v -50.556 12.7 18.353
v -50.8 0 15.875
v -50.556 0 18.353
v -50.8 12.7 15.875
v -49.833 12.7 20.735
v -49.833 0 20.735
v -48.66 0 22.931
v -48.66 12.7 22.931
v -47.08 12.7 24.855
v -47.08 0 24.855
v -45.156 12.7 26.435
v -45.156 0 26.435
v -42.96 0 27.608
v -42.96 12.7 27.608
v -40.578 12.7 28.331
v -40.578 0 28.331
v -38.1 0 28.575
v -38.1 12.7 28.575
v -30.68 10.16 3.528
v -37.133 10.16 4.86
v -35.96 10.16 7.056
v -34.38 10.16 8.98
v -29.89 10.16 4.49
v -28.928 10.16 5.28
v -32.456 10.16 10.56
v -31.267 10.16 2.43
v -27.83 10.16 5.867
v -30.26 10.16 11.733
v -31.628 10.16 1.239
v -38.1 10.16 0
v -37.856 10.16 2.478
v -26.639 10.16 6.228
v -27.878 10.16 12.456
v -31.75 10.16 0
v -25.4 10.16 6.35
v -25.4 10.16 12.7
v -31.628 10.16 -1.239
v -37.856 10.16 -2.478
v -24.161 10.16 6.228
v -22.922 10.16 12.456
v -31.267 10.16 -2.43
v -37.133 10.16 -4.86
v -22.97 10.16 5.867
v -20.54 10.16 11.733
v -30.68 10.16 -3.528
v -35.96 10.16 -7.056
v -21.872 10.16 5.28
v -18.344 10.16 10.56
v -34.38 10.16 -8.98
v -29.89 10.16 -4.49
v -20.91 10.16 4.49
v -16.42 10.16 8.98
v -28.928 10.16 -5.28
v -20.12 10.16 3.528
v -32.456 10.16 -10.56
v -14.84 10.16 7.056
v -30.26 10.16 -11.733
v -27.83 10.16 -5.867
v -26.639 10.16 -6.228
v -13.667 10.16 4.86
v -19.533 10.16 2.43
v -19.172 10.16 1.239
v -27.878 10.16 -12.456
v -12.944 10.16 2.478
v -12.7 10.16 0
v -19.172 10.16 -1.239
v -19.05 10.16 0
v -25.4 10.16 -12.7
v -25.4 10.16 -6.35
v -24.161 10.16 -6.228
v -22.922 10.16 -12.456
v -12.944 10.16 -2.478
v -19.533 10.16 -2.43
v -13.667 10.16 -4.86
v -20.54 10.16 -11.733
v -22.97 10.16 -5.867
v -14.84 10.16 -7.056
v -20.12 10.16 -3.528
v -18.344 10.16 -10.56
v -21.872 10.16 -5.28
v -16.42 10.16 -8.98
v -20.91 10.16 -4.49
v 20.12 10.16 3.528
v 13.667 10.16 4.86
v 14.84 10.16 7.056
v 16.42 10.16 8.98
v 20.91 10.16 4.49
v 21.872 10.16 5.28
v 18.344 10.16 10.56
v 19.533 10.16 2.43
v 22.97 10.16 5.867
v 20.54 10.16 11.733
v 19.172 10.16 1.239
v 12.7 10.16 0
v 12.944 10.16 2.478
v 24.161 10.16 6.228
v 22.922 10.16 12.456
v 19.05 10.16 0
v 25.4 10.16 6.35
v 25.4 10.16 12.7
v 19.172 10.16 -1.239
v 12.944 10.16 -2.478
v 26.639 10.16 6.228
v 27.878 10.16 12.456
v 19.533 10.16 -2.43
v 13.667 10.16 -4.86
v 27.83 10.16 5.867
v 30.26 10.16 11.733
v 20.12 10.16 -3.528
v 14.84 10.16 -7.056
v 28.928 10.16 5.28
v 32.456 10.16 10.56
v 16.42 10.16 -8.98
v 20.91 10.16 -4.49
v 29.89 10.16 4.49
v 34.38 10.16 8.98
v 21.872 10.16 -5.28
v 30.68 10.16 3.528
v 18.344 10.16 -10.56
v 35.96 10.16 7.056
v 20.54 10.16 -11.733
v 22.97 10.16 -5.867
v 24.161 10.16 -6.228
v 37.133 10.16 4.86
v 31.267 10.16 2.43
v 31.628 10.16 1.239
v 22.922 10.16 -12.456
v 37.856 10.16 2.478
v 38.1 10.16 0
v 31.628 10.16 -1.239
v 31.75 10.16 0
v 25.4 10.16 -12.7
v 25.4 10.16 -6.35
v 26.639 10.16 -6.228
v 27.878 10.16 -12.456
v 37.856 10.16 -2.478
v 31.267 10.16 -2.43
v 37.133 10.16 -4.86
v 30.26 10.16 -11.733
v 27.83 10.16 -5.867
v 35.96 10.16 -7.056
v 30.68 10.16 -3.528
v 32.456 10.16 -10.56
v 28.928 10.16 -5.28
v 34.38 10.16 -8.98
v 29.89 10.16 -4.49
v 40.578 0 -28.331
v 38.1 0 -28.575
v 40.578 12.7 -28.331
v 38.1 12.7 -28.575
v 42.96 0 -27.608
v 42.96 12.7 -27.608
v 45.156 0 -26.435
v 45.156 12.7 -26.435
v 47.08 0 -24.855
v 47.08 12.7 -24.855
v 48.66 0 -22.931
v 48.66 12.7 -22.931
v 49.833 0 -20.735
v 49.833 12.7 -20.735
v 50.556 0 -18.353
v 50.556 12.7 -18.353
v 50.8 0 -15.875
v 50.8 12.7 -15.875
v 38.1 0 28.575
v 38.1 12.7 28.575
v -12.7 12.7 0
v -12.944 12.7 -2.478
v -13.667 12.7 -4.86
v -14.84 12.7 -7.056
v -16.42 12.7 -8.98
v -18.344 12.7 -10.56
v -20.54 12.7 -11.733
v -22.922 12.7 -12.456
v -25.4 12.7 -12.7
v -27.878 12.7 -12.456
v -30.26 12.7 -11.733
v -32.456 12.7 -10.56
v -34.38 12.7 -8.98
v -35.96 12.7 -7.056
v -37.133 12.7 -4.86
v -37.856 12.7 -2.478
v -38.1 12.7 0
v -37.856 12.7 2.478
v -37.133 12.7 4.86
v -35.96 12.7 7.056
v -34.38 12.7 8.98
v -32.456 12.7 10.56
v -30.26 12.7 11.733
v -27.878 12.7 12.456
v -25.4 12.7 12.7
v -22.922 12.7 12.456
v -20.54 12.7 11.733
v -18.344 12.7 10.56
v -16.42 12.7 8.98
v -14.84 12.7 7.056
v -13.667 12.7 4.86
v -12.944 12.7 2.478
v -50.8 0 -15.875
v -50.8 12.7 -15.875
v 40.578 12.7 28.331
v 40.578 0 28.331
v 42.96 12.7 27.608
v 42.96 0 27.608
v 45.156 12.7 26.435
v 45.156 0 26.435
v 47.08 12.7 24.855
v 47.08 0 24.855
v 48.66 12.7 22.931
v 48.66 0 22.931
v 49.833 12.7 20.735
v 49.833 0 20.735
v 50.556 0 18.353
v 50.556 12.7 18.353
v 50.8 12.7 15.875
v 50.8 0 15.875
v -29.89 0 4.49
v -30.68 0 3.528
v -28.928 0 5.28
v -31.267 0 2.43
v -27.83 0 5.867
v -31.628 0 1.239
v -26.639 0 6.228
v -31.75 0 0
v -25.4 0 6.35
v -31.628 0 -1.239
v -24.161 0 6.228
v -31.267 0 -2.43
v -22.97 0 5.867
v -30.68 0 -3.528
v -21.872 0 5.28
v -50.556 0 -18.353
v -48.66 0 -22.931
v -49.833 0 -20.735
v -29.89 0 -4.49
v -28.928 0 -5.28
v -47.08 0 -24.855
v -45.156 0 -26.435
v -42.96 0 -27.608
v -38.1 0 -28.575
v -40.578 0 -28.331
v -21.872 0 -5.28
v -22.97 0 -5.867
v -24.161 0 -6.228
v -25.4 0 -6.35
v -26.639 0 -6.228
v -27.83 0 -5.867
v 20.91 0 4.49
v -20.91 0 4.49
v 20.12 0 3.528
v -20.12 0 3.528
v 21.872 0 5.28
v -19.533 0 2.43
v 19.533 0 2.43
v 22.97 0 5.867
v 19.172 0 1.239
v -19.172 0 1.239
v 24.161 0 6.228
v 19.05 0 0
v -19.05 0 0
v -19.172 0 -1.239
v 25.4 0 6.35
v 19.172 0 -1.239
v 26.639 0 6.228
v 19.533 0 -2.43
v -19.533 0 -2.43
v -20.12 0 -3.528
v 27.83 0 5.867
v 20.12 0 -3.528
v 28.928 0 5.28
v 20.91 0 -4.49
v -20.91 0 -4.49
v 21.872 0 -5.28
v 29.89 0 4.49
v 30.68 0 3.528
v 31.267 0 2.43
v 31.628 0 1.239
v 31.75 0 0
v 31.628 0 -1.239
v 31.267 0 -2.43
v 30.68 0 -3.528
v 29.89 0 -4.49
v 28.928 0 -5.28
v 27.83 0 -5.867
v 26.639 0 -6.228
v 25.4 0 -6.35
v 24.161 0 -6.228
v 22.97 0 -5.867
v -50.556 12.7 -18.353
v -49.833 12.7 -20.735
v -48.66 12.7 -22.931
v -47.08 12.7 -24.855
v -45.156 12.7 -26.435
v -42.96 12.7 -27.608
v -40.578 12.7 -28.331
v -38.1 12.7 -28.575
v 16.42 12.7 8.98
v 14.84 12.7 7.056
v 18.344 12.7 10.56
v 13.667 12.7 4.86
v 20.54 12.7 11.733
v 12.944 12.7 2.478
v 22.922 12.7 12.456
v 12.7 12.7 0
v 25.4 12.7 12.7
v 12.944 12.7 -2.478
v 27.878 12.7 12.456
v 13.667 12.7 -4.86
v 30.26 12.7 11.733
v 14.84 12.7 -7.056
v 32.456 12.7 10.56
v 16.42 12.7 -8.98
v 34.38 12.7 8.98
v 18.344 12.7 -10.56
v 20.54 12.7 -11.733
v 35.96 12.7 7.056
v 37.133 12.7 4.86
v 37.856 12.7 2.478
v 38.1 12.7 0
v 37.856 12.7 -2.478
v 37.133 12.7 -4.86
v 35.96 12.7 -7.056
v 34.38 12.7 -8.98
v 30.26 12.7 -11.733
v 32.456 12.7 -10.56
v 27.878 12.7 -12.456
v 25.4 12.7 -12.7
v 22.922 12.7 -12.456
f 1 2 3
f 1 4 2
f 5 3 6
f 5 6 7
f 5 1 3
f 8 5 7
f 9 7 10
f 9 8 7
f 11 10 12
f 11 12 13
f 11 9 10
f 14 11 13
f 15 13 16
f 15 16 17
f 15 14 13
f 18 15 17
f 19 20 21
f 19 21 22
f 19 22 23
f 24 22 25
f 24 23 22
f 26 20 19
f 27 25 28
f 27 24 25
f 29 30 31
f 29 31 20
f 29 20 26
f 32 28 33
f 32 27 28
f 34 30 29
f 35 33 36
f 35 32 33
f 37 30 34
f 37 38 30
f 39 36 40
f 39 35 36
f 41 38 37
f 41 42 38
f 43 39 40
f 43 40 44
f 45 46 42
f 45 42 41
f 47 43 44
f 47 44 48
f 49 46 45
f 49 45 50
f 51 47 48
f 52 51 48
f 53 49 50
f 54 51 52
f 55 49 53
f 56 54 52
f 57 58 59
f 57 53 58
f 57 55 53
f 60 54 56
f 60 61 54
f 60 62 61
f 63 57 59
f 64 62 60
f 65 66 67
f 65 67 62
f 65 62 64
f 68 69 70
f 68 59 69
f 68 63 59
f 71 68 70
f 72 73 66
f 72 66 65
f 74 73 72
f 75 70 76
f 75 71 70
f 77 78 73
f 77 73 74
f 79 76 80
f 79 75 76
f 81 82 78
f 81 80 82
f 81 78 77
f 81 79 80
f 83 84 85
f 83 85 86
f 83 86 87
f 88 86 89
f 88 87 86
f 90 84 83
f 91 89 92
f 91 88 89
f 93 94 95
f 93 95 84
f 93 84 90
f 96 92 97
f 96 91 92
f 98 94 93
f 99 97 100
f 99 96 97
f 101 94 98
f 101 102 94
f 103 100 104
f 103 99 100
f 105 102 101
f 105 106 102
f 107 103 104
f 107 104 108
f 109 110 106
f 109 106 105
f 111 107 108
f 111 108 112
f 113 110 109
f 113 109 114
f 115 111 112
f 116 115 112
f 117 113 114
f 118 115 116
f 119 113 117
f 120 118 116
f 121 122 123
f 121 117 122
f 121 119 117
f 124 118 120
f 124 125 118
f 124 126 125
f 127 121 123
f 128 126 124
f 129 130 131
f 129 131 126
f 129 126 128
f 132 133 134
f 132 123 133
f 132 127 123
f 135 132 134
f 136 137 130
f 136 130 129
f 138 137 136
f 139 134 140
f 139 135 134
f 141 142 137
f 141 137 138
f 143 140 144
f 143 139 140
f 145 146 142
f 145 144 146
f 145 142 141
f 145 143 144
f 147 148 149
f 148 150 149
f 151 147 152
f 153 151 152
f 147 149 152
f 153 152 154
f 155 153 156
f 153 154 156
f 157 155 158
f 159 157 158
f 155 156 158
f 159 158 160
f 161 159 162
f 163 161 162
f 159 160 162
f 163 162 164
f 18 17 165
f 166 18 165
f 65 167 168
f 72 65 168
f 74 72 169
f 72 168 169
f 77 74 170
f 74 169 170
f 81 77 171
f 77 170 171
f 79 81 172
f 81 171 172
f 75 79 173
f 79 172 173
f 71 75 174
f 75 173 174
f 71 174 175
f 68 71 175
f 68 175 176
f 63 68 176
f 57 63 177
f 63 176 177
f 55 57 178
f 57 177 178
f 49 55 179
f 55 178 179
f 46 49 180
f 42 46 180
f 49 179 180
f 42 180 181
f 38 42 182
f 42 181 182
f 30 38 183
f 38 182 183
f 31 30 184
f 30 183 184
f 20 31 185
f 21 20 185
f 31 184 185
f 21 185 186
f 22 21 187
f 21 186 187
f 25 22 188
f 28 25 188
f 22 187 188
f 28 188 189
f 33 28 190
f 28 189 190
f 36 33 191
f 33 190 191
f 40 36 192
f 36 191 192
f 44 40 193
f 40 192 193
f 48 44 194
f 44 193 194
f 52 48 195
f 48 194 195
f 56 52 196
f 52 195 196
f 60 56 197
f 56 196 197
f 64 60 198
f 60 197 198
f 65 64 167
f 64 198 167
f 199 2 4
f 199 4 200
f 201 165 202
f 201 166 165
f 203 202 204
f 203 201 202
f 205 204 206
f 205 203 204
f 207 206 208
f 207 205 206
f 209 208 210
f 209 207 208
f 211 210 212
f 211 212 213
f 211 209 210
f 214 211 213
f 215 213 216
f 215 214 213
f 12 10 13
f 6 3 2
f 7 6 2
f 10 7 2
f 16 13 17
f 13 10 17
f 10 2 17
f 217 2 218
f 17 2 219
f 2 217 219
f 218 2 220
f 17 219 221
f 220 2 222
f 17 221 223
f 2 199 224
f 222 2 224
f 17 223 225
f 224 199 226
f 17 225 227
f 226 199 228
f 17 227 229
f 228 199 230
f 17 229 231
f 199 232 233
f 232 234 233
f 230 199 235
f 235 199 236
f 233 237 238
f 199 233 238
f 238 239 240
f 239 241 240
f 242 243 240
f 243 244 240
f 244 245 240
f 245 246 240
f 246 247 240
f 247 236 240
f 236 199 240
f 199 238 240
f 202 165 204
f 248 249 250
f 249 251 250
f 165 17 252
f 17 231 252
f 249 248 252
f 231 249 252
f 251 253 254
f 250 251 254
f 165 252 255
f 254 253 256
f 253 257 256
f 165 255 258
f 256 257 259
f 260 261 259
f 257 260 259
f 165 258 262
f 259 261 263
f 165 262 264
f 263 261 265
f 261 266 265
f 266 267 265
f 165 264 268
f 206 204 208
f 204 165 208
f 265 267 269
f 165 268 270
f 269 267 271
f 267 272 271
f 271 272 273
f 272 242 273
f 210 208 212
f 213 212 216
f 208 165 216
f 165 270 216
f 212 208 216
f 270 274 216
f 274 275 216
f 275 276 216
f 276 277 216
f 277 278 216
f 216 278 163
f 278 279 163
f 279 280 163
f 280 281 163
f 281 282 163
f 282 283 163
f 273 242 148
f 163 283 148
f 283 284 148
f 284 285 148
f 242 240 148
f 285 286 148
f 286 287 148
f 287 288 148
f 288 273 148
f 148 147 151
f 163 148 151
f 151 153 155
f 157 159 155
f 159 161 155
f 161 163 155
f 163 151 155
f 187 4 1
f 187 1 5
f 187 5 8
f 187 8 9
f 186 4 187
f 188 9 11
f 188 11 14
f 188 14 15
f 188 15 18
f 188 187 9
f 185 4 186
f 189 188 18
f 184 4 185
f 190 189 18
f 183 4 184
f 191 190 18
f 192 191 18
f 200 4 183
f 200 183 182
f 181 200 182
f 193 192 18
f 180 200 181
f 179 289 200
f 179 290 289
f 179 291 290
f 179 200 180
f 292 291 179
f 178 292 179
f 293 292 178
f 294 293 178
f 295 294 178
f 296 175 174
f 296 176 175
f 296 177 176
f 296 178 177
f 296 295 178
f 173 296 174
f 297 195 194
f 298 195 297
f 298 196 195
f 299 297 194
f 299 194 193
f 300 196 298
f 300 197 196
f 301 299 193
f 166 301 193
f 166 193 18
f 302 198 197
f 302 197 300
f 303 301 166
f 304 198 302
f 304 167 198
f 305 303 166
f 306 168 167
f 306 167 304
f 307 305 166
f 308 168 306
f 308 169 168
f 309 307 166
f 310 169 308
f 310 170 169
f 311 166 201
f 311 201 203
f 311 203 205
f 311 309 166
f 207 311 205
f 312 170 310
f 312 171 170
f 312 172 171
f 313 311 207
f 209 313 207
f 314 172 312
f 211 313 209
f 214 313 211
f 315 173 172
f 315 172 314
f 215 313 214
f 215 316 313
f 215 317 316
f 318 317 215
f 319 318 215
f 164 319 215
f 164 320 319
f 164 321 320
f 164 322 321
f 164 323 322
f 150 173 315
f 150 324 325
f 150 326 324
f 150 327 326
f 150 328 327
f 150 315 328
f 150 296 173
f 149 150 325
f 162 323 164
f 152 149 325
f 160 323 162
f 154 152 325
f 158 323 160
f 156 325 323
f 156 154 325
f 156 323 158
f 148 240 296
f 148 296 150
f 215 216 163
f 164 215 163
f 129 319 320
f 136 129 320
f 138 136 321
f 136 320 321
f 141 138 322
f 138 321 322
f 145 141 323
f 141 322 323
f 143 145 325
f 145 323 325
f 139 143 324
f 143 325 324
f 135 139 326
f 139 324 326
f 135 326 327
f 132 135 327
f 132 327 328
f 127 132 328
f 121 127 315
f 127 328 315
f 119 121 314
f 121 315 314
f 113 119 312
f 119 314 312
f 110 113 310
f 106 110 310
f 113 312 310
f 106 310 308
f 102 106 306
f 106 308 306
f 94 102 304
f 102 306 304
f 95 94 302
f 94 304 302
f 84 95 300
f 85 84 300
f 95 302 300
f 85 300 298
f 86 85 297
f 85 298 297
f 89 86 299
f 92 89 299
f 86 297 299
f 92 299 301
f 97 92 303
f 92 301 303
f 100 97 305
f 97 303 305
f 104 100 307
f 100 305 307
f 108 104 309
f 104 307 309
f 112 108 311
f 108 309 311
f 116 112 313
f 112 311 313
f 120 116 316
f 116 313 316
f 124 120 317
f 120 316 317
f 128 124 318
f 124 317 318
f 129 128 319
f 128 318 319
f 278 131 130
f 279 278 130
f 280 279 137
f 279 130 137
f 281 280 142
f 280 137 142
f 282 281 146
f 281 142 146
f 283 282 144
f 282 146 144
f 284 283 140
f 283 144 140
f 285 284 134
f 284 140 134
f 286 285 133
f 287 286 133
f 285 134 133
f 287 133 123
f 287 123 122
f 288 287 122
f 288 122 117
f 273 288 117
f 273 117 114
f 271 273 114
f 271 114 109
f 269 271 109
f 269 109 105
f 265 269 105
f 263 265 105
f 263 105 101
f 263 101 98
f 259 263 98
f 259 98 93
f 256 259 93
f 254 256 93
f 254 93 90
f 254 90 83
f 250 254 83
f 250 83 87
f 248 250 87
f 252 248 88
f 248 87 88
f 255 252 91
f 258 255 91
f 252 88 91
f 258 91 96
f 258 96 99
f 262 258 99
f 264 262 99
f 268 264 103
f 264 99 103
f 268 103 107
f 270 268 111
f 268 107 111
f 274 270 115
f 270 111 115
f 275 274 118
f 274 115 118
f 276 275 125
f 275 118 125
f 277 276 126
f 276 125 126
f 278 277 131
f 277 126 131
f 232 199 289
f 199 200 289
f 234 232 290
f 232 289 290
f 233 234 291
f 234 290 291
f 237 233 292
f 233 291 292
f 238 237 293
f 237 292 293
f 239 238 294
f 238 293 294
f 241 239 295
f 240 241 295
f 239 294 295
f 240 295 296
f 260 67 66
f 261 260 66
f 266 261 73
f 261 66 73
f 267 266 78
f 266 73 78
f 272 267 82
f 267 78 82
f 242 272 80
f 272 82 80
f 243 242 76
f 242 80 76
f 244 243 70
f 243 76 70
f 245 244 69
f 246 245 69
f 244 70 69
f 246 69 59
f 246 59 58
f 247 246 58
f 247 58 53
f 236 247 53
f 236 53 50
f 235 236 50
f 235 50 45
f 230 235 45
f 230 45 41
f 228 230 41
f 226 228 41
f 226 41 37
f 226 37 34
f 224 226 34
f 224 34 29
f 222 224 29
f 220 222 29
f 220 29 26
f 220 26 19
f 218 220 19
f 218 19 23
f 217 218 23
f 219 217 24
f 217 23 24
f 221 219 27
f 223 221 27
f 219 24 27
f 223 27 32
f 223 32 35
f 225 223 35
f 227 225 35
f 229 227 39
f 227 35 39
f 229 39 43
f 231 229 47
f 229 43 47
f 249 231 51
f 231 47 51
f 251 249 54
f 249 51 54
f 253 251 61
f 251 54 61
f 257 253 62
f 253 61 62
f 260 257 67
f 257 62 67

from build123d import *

# Parameters (mm, degrees)
SKETCH1_W           = 101.6
SKETCH1_H           = 57.15
BOSS_EXTRUDE1_DEPTH = 12.7
SKETCH2_R           = 6.35
CUT_EXTRUDE1_DEPTH  = 12.7
SKETCH2_3_R         = 12.7
SKETCH2_3_R_2       = 6.35
CUT_EXTRUDE2_DEPTH  = 2.54
FILLET1_R           = 12.7


with BuildPart() as part:
    # Sketch1 → Boss-Extrude1 (new body)
    with BuildSketch(Plane(origin=(0, 0, 0), x_dir=(1, 0, 0), z_dir=(0, 1, 0))):
        Rectangle(SKETCH1_W, SKETCH1_H)
    extrude(amount=BOSS_EXTRUDE1_DEPTH)

    # Sketch2 → Cut-Extrude1 (cut)
    with BuildSketch(Plane(origin=(0, 12.7, 0), x_dir=(1, 0, 0), z_dir=(0, 1, 0))):
        with Locations((-25.4, 0)):
            Circle(SKETCH2_R)
        with Locations((25.4, 0)):
            Circle(SKETCH2_R)
    extrude(amount=-CUT_EXTRUDE1_DEPTH, mode=Mode.SUBTRACT)

    # Sketch2<3> → Cut-Extrude2 (cut)
    # profile 1 of 2: a face of its own
    with BuildSketch(Plane(origin=(0, 12.7, 0), x_dir=(1, 0, 0), z_dir=(0, 1, 0))):
        with Locations((-25.4, 0)):
            Circle(SKETCH2_3_R)
        with Locations((-25.4, 0)):
            Circle(SKETCH2_3_R_2, mode=Mode.SUBTRACT)
    # profile 2 of 2: a face of its own
    with BuildSketch(Plane(origin=(0, 12.7, 0), x_dir=(1, 0, 0), z_dir=(0, 1, 0))):
        with Locations((25.4, 0)):
            Circle(SKETCH2_3_R)
        with Locations((25.4, 0)):
            Circle(SKETCH2_3_R_2, mode=Mode.SUBTRACT)
    extrude(amount=-CUT_EXTRUDE2_DEPTH, mode=Mode.SUBTRACT)

    # Fillet1
    fillet1_edges = [part.edges().sort_by_distance(p)[0] for p in [
        (50.8, 6.35, -28.575),
        (-50.8, 6.35, -28.575),
        (50.8, 6.35, 28.575),
        (-50.8, 6.35, 28.575),
    ]]
    fillet(fillet1_edges, radius=FILLET1_R)


solid = part.part
